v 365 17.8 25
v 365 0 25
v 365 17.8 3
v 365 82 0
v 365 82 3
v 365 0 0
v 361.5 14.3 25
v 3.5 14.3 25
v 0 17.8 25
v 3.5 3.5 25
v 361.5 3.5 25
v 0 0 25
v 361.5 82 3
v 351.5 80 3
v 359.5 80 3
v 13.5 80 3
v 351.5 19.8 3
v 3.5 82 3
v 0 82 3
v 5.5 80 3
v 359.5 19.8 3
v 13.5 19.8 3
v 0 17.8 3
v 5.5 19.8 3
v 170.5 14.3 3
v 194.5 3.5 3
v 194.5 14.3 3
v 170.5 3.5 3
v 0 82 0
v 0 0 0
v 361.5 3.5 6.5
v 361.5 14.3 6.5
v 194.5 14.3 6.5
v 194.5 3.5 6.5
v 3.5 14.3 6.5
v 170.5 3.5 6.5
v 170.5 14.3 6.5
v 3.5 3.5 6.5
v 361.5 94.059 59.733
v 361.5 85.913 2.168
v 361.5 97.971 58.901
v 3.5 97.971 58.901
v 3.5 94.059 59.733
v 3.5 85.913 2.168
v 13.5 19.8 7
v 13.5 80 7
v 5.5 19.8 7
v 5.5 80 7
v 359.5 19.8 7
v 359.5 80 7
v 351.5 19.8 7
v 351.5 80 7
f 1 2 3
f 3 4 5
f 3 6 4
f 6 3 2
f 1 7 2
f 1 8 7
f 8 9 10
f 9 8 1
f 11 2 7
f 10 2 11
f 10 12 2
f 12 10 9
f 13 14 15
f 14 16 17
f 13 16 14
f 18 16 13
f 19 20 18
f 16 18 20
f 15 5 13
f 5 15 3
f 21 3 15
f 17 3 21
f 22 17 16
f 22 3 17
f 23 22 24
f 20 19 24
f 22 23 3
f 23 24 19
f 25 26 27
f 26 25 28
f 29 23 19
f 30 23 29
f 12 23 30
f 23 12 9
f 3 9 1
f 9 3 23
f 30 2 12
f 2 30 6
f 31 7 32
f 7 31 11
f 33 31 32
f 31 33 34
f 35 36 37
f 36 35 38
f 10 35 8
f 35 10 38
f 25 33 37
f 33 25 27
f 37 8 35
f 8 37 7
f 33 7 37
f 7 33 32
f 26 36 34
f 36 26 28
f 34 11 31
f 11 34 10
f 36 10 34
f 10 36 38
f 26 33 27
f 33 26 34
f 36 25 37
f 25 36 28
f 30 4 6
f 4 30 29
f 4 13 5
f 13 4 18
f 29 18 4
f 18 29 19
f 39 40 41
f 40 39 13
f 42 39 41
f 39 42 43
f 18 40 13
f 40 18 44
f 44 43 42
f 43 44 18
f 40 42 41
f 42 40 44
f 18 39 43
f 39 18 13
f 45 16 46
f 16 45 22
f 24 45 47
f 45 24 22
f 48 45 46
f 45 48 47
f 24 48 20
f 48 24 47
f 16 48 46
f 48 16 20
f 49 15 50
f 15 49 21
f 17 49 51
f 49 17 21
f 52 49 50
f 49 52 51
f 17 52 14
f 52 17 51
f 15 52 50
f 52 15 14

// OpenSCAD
// ═══════════════════════════════════════════════════════════════════
//  KAAMOS — monitor tray v1
//  15.6" portable USB-C monitor, desk-optimized
//  ~355mm wide × ~225mm tall × ~10mm thick
//
//  Colour map (Kaamos palette → PLA/PETG):
//    tyhjyys   #0c0c0c  →  Matte Black PLA     (body, legs, base)
//    meripihka #f0a030  →  Amber / Pumpkin PLA (end caps — small, print 2)
//    norsunluu #dfd0b0  →  Natural / Ivory PETG (grip strips — print 2)
//
//  RENDER switch:
//    0  →  main body   (Matte Black PLA)  — orient flat-base-down, no support needed
//    1  →  end cap     (Amber PLA)        — print 2, mirror one in slicer
//    2  →  grip strip  (Natural PETG)     — print 2
// ═══════════════════════════════════════════════════════════════════

RENDER = 0;

// ── monitor ──────────────────────────────────────────────────────────
MON_W   = 355;   // monitor width (mm)
MON_T   = 10;    // monitor thickness (mm) — measure your unit; 10 is typical

// ── channel (front lip) ──────────────────────────────────────────────
FIT     = 0.8;   // total clearance inside channel (loose enough to insert/remove)
WALL    = 3.5;   // wall thickness throughout
LIP_H   = 22;    // how high the front channel rises (captures bottom of monitor)
CH_W    = MON_T + FIT;                // channel inner width
LIP_D   = CH_W  + WALL * 2;          // front lip outer depth

// ── base ─────────────────────────────────────────────────────────────
LEN     = MON_W + 10;   // tray total length (5mm each end before caps)
BASE_D  = 82;            // base depth front to back
BASE_T  = 3;             // base plate thickness

// ── rear support wall ────────────────────────────────────────────────
TILT    = 12;            // degrees monitor leans back from vertical
RW_T    = 4;             // rear wall thickness
RW_H    = 58;            // rear wall height (supports monitor ~80mm up from base)

// ── end cap (amber accent) ────────────────────────────────────────────
CAP_L   = 13;            // cap depth (how far it slides over channel end)
CAP_T   = 2.5;           // cap wall thickness

// ── grip strip (natural PETG) ─────────────────────────────────────────
GRIP_L  = LEN - WALL * 2 - 6;
GRIP_W  = 5;
GRIP_T  = 1.6;

$fn = 48;

// ════════════════════════════════════════════════════════════════════
//  BODY GEOMETRY
// ════════════════════════════════════════════════════════════════════

module base_plate() {
    cube([LEN, BASE_D, BASE_T]);
}

module front_channel() {
    // U-profile rising from front edge of base
    translate([0, 0, BASE_T])
    difference() {
        cube([LEN, LIP_D, LIP_H]);
        // hollow — open top
        translate([WALL, WALL, WALL])
            cube([LEN - WALL*2, CH_W, LIP_H + 1]);
        // cable exit slot, centred at bottom of channel
        translate([LEN/2 - 12, WALL, -BASE_T])
            cube([24, CH_W, BASE_T + WALL + 1]);
    }
}

module rear_wall() {
    // angled wall the monitor face rests against
    // pivots from the rear edge of the base, leans backward TILT degrees
    translate([WALL, BASE_D, BASE_T])
    rotate([-TILT, 0, 0])
    cube([LEN - WALL*2, RW_T, RW_H]);
}

module gusset(x_pos) {
    // triangular brace connecting rear wall to base plate
    // side profile: right triangle — horizontal leg = BASE_D - LIP_D, vertical = RW_T
    gus_run = BASE_D - LIP_D - 4;
    gus_w   = 8;
    translate([x_pos, LIP_D + 2, BASE_T])
    linear_extrude(RW_T)
    polygon([
        [0, 0],
        [gus_w, 0],
        [gus_w, gus_run],
        [0, gus_run]
    ]);
}

module main_body() {
    union() {
        base_plate();
        front_channel();
        rear_wall();
        gusset(WALL + 2);
        gusset(LEN - WALL - 10);
    }
}

// ════════════════════════════════════════════════════════════════════
//  END CAP  (amber accent — print 2, mirror one in slicer)
// ════════════════════════════════════════════════════════════════════

module end_cap() {
    // press-fits over either end of the front channel
    outer_h = LIP_H + BASE_T;
    difference() {
        cube([CAP_L, LIP_D, outer_h]);
        translate([CAP_T, CAP_T, CAP_T])
            cube([CAP_L, LIP_D - CAP_T*2, outer_h]);
    }
}

// ════════════════════════════════════════════════════════════════════
//  GRIP STRIP  (natural PETG — print 2: one front wall, one rear wall)
// ════════════════════════════════════════════════════════════════════

module grip_strip() {
    // sits in the channel against the wall the monitor face touches
    // adds friction and protects monitor edge from scratching
    translate([WALL + 3, 0, 0])
    cube([GRIP_L, GRIP_W, GRIP_T]);
}

// ════════════════════════════════════════════════════════════════════
//  RENDER
// ════════════════════════════════════════════════════════════════════

if (RENDER == 0) {
    color("#111008") main_body();
    // export as: monitor_tray_body.stl
    // orient: flat base down — no supports required
}

if (RENDER == 1) {
    color("#f0a030") end_cap();
    // export as: monitor_tray_cap.stl — print 2, mirror one in slicer
    // orient: open face down
}

if (RENDER == 2) {
    color("#dfd0b0") grip_strip();
    // export as: monitor_tray_grip.stl — print 2 (PETG)
    // press into channel front and back walls after printing body
}
